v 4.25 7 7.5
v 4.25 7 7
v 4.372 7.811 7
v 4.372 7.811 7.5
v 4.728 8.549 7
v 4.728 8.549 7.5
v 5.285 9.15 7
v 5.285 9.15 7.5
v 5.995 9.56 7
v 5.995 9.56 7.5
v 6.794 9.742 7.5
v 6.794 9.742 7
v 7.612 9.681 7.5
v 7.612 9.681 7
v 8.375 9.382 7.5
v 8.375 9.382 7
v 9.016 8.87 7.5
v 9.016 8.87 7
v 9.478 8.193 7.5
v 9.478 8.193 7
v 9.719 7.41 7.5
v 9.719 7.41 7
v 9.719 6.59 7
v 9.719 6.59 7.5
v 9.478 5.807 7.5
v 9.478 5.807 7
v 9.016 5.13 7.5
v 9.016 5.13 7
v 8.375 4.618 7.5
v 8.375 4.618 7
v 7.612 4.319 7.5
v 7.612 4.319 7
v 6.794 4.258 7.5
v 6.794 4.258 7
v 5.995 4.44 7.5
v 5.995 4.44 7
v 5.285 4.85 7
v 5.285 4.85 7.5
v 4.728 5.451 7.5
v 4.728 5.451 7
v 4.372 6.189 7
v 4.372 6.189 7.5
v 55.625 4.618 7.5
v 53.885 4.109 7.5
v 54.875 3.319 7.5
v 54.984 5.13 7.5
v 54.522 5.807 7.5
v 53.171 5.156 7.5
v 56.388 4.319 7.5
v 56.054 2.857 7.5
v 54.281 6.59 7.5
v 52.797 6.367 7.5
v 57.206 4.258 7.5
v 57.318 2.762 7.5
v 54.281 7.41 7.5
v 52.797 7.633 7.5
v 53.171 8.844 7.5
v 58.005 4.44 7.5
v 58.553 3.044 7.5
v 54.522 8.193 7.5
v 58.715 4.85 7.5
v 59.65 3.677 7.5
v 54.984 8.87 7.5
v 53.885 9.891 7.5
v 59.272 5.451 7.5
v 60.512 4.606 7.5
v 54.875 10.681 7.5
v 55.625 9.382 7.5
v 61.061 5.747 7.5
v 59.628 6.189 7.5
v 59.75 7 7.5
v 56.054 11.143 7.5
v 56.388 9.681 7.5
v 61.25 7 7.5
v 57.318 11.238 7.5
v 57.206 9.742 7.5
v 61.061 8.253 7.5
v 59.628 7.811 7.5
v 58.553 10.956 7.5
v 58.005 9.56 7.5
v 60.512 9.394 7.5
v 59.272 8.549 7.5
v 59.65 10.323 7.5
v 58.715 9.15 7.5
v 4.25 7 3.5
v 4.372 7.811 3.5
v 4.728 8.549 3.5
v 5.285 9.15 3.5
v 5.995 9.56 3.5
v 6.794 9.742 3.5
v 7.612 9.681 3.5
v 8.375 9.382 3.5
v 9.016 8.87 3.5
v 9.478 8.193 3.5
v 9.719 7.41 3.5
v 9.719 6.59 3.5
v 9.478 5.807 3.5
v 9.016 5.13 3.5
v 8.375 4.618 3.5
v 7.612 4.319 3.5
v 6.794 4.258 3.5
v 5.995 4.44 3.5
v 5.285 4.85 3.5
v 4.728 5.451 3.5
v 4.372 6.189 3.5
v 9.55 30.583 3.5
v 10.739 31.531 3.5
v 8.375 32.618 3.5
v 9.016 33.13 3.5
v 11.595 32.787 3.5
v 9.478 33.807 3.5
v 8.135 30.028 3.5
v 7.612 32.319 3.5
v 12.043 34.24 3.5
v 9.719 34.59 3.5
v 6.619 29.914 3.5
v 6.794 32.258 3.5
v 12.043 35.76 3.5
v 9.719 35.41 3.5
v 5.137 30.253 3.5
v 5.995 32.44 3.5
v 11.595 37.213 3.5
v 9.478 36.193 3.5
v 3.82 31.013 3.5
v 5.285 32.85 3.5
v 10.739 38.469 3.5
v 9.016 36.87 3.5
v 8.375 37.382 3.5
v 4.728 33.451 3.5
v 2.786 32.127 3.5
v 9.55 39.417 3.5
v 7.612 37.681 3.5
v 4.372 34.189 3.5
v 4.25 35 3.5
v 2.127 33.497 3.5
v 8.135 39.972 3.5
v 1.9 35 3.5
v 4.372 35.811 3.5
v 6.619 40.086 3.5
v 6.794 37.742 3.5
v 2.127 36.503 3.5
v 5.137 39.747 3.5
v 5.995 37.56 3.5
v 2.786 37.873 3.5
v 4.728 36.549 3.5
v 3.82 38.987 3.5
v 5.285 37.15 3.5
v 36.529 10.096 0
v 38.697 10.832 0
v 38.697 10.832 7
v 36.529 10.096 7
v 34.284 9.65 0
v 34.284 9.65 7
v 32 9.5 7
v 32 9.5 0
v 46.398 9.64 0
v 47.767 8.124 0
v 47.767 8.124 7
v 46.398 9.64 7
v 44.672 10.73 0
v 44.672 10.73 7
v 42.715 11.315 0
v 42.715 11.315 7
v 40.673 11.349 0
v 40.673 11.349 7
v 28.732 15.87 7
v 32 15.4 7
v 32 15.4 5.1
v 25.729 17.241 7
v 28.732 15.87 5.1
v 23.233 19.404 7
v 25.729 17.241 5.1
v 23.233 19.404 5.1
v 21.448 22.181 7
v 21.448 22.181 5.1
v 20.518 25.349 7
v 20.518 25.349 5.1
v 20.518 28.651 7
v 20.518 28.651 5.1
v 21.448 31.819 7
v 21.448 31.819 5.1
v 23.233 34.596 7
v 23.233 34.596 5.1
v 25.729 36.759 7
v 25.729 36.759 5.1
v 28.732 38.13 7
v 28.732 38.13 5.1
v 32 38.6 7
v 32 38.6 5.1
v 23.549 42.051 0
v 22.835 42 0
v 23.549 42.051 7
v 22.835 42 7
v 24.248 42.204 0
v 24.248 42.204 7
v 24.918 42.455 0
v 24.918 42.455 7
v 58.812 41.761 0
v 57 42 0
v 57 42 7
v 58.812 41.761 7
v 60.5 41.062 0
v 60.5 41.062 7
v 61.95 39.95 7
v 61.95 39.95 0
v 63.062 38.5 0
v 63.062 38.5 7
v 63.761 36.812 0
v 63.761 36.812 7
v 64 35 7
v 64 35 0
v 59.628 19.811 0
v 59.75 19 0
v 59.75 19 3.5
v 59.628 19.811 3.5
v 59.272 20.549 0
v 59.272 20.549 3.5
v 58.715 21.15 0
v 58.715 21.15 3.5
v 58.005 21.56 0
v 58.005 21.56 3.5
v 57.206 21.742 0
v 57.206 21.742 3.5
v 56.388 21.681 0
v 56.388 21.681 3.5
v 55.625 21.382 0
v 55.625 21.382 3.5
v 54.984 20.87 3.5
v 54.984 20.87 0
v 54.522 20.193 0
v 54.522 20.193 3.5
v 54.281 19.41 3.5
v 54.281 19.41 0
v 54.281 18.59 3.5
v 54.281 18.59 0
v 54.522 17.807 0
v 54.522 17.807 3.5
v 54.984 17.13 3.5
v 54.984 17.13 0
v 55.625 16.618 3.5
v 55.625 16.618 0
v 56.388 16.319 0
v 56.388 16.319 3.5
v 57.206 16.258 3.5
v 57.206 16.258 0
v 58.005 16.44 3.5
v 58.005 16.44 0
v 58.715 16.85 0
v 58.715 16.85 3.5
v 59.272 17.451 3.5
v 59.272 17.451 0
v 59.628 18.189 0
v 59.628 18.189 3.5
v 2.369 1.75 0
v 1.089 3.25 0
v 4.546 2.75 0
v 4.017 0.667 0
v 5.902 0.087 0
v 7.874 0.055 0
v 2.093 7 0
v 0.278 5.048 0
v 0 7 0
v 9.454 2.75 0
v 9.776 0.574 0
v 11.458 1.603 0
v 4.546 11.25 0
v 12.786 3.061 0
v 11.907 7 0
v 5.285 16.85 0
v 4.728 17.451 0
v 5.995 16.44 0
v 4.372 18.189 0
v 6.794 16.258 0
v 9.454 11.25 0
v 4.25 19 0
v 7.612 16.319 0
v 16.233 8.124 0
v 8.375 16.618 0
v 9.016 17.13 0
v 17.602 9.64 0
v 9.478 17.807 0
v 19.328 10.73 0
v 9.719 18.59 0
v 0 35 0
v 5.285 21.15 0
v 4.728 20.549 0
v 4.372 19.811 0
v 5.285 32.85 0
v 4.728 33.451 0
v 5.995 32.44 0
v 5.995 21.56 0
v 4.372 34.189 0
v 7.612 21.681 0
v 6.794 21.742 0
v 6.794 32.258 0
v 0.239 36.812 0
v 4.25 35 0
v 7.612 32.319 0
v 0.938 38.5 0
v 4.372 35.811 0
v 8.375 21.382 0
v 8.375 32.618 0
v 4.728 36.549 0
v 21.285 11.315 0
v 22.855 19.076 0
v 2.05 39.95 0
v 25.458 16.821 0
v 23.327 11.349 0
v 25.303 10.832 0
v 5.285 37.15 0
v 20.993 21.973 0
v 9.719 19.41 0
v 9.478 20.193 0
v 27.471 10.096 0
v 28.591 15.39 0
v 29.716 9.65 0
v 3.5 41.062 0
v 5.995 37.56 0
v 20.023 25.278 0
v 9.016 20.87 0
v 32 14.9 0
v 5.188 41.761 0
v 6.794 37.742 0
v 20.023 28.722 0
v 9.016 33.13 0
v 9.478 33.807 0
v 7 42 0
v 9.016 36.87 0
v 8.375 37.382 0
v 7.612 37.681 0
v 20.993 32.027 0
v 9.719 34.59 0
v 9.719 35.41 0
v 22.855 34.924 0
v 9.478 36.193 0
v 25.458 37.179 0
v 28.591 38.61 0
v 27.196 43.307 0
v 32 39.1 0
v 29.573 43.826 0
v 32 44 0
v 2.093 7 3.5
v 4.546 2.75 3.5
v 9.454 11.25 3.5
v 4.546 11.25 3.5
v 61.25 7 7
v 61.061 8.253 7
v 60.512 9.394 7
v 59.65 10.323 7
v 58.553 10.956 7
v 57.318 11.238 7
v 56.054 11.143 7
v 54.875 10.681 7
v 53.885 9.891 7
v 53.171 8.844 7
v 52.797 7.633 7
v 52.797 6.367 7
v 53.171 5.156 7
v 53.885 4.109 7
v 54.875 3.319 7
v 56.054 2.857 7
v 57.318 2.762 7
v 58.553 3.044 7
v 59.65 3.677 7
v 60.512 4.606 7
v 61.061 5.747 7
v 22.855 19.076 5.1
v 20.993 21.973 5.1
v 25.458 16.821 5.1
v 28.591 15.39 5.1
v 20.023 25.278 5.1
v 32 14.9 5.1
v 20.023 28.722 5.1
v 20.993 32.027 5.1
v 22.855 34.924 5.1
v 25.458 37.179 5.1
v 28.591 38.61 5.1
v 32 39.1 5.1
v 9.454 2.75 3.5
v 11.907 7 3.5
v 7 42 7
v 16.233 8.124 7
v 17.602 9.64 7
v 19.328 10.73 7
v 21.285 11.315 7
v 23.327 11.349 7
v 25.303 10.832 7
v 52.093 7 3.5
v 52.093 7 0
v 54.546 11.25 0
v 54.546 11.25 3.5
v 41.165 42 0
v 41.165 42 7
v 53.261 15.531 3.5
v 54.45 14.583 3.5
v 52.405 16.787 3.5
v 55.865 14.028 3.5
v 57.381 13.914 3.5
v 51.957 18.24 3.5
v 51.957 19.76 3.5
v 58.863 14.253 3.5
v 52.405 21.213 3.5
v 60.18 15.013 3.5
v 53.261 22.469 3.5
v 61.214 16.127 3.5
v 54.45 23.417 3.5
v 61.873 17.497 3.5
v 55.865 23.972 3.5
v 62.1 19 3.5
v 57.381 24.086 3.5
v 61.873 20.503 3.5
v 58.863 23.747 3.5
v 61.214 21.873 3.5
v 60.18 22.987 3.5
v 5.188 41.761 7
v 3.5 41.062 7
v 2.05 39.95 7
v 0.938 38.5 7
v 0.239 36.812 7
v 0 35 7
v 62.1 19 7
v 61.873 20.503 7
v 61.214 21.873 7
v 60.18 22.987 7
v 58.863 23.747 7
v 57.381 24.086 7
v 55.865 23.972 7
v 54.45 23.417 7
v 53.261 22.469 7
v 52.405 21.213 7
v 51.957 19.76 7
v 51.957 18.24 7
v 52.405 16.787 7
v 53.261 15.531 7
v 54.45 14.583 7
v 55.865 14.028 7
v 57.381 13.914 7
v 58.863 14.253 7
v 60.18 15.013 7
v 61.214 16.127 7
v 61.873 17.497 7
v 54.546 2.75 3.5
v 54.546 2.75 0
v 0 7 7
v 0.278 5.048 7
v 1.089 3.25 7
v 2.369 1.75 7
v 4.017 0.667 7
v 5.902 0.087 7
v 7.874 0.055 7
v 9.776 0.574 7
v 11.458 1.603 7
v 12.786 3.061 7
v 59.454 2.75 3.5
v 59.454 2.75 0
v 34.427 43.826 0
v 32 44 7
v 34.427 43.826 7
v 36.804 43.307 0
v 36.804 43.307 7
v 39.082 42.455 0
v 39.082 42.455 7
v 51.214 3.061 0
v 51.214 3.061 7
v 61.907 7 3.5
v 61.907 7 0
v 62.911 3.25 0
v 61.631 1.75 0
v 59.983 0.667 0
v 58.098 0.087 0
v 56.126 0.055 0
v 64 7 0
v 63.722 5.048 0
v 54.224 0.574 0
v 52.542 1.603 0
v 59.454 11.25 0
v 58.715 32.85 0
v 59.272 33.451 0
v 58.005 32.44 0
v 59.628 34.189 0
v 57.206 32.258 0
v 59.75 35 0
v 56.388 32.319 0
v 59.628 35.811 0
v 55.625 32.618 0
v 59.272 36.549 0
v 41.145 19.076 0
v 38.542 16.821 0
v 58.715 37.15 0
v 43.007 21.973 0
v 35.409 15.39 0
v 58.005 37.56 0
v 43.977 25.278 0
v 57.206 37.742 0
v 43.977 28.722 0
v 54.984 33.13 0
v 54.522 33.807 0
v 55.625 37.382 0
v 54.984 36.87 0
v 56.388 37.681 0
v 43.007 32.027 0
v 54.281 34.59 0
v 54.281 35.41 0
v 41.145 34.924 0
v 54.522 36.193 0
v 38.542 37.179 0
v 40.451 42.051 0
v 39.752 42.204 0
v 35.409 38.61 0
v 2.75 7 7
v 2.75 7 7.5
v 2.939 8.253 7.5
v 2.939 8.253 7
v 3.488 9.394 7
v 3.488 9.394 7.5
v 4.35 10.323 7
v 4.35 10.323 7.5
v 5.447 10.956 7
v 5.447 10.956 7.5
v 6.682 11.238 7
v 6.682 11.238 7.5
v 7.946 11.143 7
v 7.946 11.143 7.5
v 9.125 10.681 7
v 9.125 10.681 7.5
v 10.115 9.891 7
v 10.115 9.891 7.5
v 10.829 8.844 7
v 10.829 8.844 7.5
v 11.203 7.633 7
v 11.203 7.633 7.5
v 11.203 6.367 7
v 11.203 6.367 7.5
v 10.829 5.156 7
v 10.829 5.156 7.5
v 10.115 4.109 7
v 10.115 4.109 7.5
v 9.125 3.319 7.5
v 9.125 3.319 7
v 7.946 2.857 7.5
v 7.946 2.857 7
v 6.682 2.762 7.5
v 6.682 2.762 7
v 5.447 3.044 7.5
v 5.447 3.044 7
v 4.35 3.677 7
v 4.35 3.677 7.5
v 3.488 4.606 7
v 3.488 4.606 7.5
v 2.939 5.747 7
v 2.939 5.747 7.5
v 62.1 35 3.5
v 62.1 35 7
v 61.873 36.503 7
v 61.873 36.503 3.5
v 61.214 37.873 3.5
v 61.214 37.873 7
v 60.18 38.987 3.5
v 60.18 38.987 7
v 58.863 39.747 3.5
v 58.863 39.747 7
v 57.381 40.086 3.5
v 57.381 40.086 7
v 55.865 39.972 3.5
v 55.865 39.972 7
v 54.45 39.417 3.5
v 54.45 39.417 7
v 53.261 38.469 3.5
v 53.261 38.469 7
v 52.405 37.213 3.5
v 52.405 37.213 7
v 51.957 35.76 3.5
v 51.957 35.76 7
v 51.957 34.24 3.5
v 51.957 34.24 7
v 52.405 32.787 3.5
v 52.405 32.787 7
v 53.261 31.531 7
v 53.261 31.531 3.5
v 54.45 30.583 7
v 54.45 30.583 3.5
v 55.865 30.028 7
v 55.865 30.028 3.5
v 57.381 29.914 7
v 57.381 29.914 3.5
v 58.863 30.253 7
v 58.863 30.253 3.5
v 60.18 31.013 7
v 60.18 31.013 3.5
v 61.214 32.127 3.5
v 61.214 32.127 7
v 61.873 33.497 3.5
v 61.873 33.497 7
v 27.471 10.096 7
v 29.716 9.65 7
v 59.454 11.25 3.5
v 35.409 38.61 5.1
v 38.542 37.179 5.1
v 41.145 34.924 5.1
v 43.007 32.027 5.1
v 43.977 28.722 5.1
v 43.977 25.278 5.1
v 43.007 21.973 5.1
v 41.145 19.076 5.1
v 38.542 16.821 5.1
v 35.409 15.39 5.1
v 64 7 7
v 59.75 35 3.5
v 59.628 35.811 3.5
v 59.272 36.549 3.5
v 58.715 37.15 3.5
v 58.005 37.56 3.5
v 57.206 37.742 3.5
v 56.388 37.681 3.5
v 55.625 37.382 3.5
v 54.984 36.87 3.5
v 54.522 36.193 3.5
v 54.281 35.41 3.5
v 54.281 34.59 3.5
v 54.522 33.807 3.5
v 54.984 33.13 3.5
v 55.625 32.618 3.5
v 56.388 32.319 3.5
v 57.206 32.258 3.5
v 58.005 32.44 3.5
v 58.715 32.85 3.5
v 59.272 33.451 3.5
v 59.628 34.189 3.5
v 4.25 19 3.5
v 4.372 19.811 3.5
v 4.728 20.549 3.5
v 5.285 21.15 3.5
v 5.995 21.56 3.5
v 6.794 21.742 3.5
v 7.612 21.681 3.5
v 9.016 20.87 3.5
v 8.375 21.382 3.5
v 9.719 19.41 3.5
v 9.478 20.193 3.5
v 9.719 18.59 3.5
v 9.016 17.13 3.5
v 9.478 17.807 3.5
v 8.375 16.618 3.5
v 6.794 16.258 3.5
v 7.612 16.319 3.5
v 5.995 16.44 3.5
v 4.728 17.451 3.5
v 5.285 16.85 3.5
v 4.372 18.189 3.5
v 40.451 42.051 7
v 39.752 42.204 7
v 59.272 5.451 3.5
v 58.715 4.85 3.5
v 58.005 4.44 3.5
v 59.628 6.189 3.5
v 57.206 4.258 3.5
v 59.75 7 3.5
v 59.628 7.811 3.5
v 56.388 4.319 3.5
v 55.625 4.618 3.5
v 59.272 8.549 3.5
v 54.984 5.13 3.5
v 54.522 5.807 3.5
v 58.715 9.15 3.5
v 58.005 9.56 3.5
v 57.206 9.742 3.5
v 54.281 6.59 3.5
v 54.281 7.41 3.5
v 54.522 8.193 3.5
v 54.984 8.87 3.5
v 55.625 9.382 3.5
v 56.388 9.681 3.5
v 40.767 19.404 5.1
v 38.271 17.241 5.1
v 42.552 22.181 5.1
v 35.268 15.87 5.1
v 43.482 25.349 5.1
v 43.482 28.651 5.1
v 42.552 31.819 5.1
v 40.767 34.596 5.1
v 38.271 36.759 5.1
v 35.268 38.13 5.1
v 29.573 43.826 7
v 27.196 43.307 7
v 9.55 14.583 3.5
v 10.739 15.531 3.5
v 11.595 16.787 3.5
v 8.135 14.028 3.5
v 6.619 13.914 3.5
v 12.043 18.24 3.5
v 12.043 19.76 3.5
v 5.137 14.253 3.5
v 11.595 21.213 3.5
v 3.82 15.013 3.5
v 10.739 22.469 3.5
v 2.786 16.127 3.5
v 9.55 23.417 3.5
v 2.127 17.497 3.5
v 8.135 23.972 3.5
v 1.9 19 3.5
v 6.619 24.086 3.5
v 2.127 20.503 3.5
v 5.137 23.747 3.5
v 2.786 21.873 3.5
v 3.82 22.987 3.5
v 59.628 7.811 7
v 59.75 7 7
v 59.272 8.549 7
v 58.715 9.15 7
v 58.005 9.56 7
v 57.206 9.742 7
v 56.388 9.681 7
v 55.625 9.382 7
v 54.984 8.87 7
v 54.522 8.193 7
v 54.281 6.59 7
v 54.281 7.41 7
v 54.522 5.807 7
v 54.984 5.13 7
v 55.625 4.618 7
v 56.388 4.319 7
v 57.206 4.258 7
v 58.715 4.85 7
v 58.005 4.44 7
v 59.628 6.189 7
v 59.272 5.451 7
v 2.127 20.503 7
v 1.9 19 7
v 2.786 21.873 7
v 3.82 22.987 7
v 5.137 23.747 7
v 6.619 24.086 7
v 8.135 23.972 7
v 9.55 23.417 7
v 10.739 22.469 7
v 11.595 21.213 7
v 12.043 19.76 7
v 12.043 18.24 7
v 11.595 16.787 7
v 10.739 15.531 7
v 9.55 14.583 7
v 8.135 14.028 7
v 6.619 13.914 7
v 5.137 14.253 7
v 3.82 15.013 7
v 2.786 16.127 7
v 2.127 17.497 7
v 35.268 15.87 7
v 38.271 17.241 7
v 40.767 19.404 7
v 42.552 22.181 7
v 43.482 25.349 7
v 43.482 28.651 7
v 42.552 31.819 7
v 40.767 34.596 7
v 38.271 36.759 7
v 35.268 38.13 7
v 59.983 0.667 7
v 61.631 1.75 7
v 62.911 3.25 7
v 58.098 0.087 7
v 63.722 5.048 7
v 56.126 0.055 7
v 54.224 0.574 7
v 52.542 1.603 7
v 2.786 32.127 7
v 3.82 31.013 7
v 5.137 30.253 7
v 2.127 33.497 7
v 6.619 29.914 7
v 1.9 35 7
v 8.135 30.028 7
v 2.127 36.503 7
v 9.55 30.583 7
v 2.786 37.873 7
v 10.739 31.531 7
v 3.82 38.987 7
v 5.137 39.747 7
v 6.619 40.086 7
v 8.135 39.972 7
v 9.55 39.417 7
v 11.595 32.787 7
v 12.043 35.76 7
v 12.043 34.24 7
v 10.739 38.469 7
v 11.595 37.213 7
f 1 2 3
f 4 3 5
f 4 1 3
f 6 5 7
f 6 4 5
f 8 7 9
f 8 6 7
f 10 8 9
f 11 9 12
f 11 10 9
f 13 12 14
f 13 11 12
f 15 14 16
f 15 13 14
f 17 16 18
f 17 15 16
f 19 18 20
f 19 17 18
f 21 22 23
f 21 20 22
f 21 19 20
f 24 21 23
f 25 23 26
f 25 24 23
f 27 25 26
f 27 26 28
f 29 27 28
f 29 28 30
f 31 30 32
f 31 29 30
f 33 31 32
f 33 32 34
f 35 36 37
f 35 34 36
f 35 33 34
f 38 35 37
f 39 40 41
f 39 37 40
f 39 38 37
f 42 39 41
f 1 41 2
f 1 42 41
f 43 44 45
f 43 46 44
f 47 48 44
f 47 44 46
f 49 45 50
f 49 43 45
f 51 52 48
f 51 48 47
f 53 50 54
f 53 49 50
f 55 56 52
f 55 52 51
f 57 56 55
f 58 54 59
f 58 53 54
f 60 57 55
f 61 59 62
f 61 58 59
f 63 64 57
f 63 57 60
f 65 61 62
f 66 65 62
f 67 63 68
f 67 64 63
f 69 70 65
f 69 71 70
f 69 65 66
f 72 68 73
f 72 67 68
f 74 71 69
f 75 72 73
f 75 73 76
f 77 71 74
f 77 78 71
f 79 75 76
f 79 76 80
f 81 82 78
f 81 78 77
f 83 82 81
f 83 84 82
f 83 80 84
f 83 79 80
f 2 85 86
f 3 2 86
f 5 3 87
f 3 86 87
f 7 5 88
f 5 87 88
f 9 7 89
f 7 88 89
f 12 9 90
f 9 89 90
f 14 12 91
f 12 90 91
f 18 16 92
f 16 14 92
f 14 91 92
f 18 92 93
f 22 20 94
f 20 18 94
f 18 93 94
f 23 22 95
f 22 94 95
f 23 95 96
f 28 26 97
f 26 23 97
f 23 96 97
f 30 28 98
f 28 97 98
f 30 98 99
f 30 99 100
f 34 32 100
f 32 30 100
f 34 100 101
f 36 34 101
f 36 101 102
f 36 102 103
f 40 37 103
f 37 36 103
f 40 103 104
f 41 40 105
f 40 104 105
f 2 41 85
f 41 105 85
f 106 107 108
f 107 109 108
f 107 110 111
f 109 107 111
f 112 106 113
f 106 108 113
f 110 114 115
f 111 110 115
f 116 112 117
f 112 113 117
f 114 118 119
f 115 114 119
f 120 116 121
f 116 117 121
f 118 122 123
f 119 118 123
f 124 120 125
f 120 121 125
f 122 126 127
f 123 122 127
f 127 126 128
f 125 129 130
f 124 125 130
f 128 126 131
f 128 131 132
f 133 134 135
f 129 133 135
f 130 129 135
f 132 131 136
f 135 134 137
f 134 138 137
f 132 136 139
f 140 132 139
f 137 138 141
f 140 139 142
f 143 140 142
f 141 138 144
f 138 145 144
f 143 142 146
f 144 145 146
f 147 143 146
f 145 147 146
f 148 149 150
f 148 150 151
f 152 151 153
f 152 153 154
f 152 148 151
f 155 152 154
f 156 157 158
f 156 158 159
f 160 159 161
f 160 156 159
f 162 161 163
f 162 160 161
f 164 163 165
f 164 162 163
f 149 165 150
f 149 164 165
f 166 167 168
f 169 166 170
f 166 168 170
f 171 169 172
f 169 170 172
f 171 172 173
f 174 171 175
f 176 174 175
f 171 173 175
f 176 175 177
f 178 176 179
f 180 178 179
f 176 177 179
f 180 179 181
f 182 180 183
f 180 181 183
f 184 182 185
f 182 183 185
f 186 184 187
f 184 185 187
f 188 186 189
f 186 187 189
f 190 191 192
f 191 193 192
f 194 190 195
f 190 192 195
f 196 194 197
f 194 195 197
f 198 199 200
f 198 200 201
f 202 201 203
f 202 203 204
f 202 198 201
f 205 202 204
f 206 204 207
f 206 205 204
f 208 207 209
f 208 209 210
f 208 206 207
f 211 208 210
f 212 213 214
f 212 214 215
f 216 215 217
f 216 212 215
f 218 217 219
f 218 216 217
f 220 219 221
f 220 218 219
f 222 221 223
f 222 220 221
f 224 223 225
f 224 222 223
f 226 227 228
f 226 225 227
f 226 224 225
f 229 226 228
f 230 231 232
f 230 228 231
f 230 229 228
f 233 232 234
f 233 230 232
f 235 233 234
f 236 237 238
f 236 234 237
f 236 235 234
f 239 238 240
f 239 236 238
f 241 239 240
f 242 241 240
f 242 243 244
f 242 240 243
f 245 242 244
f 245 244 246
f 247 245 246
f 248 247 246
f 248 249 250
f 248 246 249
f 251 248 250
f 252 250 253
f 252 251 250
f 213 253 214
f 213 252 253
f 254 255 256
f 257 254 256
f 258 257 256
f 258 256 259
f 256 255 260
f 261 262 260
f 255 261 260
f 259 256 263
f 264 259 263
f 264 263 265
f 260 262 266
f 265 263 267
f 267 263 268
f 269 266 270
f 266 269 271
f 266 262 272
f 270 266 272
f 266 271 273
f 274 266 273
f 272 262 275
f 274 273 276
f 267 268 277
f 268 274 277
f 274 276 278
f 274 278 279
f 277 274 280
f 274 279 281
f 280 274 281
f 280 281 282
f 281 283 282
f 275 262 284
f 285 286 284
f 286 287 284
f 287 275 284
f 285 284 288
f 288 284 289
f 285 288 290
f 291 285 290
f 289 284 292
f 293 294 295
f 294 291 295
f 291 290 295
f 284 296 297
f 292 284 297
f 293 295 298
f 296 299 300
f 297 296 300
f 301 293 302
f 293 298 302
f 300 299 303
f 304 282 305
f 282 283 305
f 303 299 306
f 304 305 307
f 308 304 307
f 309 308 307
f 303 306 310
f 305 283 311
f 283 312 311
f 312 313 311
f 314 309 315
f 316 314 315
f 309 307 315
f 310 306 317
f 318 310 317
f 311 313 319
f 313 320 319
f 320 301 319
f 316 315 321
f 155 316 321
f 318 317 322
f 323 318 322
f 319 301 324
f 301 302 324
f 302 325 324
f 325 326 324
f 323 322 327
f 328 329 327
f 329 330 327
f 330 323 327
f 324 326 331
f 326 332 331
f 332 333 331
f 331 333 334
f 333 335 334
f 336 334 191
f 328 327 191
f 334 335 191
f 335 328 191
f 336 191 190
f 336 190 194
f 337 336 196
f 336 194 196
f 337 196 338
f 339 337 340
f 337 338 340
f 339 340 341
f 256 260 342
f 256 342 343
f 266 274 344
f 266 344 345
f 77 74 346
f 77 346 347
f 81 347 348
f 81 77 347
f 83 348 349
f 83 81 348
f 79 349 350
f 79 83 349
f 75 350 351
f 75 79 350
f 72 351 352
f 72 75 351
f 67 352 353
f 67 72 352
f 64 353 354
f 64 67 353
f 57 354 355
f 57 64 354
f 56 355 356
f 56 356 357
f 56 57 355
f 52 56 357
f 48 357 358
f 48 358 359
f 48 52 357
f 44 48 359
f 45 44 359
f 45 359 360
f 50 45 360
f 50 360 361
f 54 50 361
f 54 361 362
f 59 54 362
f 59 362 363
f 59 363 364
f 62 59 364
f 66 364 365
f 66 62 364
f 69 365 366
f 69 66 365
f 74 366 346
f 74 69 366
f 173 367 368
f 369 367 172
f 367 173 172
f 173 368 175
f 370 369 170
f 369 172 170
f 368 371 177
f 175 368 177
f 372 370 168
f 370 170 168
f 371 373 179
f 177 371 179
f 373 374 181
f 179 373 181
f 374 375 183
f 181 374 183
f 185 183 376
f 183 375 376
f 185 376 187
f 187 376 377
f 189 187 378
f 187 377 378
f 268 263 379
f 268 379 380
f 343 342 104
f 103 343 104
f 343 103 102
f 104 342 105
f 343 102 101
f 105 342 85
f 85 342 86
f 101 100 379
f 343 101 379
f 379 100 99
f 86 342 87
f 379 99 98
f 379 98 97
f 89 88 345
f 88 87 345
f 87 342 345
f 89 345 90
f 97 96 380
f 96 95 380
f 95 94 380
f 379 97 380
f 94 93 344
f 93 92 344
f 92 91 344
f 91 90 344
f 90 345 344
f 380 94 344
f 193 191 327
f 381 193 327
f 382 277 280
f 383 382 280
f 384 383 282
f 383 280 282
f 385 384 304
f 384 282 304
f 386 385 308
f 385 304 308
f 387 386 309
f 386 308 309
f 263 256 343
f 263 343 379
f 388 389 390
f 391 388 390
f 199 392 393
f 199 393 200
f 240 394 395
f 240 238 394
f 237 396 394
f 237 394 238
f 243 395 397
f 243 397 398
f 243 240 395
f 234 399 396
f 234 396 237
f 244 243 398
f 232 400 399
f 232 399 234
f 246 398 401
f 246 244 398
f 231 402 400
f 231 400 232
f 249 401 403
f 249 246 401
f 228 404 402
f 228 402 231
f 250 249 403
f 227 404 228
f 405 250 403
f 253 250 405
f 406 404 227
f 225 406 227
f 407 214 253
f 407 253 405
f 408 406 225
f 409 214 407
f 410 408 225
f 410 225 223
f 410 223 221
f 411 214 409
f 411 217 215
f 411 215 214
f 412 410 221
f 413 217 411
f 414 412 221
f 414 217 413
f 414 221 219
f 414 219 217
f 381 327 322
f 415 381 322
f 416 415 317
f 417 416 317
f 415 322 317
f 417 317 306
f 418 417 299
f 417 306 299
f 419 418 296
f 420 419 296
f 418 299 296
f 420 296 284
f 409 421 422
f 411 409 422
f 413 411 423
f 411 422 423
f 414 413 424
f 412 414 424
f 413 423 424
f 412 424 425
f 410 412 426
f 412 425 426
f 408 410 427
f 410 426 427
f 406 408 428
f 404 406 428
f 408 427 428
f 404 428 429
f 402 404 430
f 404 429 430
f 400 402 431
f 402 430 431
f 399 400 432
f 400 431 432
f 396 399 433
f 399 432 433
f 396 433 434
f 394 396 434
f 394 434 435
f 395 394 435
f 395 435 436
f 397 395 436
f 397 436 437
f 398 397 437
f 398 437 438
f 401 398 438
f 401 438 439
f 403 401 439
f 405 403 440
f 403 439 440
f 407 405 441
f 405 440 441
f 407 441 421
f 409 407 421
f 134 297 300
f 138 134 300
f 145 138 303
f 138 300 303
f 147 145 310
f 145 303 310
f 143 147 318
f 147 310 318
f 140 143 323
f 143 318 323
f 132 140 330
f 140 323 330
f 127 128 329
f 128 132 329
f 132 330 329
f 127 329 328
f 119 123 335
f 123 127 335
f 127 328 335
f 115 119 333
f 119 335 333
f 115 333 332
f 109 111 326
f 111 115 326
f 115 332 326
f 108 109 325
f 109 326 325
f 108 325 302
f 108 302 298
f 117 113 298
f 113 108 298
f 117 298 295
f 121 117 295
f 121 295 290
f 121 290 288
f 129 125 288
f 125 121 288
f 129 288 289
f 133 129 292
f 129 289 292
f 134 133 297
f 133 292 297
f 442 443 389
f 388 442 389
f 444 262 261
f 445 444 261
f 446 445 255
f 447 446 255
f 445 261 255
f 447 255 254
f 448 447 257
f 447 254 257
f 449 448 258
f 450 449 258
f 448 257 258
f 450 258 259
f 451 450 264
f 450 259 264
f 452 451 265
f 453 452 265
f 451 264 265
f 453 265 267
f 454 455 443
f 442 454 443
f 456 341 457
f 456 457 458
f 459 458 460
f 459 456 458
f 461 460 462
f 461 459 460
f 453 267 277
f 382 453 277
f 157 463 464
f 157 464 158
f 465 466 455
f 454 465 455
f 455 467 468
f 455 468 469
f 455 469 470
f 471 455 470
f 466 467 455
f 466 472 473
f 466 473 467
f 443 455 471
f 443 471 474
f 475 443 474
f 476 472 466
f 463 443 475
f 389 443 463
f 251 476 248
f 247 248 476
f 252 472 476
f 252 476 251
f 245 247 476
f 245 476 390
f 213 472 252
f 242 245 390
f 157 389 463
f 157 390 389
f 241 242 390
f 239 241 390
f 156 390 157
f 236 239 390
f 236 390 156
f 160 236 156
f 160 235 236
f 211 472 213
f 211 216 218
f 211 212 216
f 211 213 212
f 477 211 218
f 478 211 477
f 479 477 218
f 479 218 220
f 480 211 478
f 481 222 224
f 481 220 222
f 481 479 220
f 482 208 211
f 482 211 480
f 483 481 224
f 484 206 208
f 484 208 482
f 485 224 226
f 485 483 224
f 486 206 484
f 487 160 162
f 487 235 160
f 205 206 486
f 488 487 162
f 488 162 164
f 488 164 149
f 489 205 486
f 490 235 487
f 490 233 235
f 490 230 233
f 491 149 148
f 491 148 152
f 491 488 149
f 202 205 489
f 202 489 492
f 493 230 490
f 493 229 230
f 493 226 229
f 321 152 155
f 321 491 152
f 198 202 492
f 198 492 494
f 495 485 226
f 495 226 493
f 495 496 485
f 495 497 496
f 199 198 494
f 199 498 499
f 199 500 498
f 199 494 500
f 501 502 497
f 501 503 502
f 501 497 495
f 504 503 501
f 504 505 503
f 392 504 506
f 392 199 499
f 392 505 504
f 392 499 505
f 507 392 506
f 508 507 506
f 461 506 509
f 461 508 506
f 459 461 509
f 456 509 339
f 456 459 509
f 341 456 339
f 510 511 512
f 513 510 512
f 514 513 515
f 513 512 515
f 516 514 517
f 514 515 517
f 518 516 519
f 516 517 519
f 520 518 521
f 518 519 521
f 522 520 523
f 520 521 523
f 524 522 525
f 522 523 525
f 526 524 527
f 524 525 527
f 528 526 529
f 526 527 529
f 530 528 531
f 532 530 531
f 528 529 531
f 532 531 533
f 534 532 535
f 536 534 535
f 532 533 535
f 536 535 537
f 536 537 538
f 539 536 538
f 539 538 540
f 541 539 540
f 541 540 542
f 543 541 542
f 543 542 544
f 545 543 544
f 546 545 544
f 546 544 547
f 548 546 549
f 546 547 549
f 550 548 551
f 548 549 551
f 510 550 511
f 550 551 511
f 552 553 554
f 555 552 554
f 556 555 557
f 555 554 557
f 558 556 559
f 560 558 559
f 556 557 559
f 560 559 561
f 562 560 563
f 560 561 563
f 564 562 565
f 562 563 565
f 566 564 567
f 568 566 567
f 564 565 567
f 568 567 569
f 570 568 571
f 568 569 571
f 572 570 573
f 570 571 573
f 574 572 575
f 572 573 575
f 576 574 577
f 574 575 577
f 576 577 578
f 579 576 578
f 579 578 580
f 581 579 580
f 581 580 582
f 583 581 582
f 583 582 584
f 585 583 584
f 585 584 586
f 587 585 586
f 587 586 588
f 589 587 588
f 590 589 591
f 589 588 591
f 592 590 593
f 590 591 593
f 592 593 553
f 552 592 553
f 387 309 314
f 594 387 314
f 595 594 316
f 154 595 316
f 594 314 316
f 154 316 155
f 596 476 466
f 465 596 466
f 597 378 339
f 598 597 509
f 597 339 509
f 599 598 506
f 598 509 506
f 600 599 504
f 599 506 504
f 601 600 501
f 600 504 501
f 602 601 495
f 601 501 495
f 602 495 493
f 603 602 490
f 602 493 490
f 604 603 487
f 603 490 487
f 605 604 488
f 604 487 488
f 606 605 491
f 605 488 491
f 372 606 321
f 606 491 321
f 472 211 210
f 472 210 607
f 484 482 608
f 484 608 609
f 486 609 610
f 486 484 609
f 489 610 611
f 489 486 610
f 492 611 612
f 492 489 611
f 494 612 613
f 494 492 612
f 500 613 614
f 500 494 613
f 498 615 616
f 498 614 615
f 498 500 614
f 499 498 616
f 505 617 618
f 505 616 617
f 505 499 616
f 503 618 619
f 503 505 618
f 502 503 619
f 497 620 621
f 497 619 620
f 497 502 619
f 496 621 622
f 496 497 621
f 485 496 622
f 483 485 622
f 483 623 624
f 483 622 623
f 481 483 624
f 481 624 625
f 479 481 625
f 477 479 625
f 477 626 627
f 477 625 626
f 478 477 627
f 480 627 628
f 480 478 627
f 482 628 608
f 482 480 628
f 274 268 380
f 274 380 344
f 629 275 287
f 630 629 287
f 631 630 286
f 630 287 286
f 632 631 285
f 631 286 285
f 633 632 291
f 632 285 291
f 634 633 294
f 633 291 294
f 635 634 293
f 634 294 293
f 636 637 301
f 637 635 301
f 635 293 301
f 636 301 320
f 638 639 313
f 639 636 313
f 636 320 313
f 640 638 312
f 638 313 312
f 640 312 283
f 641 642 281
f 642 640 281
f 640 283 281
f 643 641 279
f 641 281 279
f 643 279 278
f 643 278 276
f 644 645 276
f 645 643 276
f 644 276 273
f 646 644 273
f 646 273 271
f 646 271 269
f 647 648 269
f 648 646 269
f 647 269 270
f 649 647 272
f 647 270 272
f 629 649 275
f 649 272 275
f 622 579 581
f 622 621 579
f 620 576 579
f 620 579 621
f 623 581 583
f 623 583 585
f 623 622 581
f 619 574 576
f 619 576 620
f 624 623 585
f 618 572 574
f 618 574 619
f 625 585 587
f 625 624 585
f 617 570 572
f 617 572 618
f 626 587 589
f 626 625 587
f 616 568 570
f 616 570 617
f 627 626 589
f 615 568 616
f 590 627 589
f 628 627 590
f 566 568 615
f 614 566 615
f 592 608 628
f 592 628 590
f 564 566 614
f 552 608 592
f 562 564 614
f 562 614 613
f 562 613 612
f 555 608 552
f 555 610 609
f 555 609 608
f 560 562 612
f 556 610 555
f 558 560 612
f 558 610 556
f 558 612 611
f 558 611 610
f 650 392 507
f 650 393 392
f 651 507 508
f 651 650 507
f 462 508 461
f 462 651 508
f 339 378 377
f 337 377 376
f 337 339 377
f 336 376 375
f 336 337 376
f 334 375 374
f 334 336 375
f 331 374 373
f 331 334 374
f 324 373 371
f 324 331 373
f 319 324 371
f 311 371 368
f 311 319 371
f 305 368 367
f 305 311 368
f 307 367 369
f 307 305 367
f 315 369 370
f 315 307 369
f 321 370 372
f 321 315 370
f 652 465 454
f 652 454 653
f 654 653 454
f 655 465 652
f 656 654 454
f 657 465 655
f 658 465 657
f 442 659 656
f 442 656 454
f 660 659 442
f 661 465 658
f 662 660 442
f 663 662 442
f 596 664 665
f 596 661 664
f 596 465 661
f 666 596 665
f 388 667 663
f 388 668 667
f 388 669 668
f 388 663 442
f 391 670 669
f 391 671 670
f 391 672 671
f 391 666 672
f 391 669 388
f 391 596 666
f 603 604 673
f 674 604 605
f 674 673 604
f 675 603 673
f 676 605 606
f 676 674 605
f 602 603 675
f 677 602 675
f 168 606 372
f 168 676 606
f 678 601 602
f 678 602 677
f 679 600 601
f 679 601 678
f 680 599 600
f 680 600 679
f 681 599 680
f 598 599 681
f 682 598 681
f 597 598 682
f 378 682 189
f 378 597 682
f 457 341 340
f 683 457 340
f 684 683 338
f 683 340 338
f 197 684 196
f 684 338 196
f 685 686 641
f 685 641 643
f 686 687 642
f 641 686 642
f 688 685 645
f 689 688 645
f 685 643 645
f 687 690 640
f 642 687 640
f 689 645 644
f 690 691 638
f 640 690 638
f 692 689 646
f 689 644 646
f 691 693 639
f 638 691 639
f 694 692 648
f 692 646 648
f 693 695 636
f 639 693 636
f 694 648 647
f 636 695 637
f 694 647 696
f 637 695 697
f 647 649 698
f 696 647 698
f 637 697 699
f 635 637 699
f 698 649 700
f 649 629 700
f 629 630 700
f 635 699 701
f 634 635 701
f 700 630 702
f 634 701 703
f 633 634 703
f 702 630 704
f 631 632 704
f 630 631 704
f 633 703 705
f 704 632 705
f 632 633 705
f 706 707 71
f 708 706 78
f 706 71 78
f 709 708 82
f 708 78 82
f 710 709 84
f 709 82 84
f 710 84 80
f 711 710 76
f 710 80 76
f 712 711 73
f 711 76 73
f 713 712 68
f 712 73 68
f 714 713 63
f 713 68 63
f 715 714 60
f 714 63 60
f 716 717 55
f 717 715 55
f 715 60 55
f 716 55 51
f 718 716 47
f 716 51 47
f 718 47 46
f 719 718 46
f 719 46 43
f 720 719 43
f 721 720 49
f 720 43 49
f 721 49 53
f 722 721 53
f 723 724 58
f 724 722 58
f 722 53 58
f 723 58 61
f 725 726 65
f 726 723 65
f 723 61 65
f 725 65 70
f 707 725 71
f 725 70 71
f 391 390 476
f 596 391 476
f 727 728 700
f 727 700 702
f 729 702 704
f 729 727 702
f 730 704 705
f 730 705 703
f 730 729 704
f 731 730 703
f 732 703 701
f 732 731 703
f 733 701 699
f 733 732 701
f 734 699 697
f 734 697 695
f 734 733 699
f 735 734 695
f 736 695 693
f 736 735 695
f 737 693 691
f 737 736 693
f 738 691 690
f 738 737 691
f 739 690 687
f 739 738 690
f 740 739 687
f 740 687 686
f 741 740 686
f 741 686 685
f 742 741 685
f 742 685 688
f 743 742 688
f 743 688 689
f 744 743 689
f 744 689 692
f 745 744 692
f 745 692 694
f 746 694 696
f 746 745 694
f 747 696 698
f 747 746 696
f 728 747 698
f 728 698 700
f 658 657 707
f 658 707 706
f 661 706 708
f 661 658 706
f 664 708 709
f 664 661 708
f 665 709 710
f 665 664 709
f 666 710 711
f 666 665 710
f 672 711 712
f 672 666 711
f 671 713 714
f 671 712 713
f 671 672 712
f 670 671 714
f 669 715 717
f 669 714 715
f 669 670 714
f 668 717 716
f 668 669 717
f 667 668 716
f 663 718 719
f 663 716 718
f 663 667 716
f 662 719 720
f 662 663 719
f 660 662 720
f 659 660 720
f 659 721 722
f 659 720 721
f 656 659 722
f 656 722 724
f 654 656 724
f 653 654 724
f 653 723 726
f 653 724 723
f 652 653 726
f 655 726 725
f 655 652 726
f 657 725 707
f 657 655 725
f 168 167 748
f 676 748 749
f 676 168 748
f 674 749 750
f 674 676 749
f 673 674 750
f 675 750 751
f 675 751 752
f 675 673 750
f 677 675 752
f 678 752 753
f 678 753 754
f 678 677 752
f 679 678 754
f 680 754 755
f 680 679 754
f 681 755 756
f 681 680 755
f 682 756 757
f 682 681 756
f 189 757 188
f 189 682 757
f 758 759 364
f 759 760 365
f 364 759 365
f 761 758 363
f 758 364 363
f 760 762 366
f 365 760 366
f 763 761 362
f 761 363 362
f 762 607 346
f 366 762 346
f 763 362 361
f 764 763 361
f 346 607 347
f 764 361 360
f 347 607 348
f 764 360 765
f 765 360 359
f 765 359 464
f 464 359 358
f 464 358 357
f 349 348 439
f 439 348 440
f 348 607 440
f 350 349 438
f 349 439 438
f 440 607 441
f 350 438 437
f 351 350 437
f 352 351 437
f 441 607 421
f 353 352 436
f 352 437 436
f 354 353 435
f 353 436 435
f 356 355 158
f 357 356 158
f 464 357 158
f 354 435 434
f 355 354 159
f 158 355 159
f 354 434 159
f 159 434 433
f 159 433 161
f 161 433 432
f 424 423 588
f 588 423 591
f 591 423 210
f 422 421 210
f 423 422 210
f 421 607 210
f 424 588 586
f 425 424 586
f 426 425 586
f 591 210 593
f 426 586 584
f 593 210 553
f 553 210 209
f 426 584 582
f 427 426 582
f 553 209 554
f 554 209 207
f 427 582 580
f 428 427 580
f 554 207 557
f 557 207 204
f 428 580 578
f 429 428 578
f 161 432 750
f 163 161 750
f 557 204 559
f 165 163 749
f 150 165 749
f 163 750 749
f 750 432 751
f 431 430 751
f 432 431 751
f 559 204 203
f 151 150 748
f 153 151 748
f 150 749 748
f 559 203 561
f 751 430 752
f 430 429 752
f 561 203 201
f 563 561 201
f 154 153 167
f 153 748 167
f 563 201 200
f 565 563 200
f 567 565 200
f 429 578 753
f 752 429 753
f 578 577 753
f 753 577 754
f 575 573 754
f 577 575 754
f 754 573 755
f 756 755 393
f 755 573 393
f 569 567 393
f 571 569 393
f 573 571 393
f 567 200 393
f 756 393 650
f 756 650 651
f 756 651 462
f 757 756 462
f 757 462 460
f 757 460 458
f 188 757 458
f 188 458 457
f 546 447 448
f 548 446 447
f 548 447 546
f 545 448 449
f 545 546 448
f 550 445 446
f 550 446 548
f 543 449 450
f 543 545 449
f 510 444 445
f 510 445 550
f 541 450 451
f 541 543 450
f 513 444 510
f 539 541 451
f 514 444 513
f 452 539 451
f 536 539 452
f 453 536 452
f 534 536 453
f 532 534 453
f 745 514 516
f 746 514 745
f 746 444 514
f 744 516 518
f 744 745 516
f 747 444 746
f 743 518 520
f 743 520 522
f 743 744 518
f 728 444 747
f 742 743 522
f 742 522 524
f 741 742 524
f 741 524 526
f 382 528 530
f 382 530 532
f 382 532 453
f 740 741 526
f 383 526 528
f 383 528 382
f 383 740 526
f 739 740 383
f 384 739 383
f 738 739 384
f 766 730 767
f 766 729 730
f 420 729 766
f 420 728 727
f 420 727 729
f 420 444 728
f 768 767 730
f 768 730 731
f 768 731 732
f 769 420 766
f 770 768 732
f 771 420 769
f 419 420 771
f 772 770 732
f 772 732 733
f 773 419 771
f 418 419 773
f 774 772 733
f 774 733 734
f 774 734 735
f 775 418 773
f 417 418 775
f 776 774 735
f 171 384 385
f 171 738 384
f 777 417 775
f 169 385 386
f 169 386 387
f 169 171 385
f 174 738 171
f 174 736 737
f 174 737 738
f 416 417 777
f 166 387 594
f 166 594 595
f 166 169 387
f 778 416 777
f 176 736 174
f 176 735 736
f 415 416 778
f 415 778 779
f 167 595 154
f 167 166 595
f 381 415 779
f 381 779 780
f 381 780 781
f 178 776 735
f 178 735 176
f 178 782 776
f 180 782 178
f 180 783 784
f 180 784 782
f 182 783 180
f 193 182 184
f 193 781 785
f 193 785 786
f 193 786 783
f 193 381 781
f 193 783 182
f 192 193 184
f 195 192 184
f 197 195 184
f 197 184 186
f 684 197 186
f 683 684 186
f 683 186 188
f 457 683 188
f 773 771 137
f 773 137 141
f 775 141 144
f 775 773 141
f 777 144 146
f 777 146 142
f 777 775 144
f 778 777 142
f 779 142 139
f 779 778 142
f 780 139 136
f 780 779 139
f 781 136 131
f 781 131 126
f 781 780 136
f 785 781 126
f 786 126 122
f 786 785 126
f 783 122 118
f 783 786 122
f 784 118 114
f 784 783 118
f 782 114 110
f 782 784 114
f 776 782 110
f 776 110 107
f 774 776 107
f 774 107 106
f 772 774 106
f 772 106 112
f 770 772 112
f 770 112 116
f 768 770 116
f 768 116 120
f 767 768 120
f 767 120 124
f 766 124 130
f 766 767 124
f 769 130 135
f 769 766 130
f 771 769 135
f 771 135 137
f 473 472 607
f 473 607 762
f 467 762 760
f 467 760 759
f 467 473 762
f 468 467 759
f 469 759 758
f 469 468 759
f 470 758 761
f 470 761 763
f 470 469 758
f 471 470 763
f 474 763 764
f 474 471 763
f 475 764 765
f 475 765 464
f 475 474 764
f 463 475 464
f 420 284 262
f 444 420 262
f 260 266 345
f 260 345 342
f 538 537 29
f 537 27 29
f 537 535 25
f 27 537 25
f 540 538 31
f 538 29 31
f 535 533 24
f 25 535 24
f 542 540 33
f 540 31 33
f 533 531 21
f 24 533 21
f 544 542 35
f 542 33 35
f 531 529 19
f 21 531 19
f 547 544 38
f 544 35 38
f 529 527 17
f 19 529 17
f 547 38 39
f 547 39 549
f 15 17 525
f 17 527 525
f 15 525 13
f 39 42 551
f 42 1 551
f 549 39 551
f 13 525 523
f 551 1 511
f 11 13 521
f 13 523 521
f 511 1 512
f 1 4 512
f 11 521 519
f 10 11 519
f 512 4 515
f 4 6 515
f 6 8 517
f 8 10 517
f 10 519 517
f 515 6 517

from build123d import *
from build123d.topology import SkipClean

# Parameters (mm, degrees)
BOSS_EXTRUDE1_DEPTH     = 7
CUT_EXTRUDE1_DEPTH      = 78.980769199
CUT_EXTRUDE1_DEPTH_BACK = 78.980769199
SKETCH3_R               = 2.75
SKETCH4_R               = 12.1
CUT_EXTRUDE2_DEPTH      = 5.1
BOSS_EXTRUDE2_START     = 0.5
SKETCH5_R               = 4.25
SKETCH5_R_2             = 2.75
BOSS_EXTRUDE2_DEPTH     = 0.5
SKETCH6_R               = 5.1
CUT_EXTRUDE3_DEPTH      = 3.5
FILLET1_R               = 5
CUT_EXTRUDE4_DEPTH      = 3.5


with BuildPart() as part:
    # Sketch1 → Boss-Extrude1 (new body)
    with BuildSketch(Plane.XY):
        with BuildLine():
            Line((64.000002369, 34.999998632), (64.000002369, 7.0000007))
            ThreePointArc((64.000002369, 7.0000007), (59.061035156, 0.310296383), (51.213675554, 3.060657863))
            Line((51.213675554, 3.060657863), (47.766721553, 8.123736451))
            ThreePointArc((47.766721553, 8.123736451), (43.713065604, 11.089441566), (38.696960231, 10.832108598))
            ThreePointArc((38.696960231, 10.832108598), (35.414081121, 9.836258221), (32.00000085, 9.5000007))
            Line((32.00000085, 9.5000007), (32.00000085, 15.4000007))
            ThreePointArc((32.00000085, 15.4000007), (43.60000085, 27.0000007), (32.00000085, 38.6000007))
            Line((32.00000085, 38.6000007), (32.00000085, 44.0000007))
            ThreePointArc((32.00000085, 44.0000007), (36.123106475, 43.492423203), (40.00000085, 42.0000007))
            Line((40.00000085, 42.0000007), (57.000002369, 42.0000007))
            ThreePointArc((57.000002369, 42.0000007), (61.9497513, 39.949747563), (64.000002369, 34.999998632))
        make_face()
    extrude(amount=BOSS_EXTRUDE1_DEPTH)

    # Sketch3 → Cut-Extrude1 (cut, two sides: drawn at the far end of the back side and taken through both)
    with BuildSketch(Plane.XY.offset(7).offset(-CUT_EXTRUDE1_DEPTH_BACK)):
        with Locations((56.999999697, 35.000001537)):
            Circle(SKETCH3_R)
        with Locations((56.999999697, 19.000001537)):
            Circle(SKETCH3_R)
        with Locations((56.999999697, 7.000001537)):
            Circle(SKETCH3_R)
    extrude(amount=CUT_EXTRUDE1_DEPTH + CUT_EXTRUDE1_DEPTH_BACK, mode=Mode.SUBTRACT)

    # Sketch4 → Cut-Extrude2 (cut)
    with BuildSketch(Plane(origin=(0, 0, 0), x_dir=(-1, 0, 0), z_dir=(0, 0, -1))):
        with Locations((-32.00000085, 27.0000007)):
            Circle(SKETCH4_R)
    extrude(amount=-CUT_EXTRUDE2_DEPTH, mode=Mode.SUBTRACT)

    # Sketch5 → Boss-Extrude2 (add)
    with BuildSketch(Plane.XY.offset(7).offset(BOSS_EXTRUDE2_START)):
        with Locations((56.999999697, 7.000001537)):
            Circle(SKETCH5_R)
        with Locations((56.999999697, 7.000001537)):
            Circle(SKETCH5_R_2, mode=Mode.SUBTRACT)
    extrude(amount=-BOSS_EXTRUDE2_DEPTH)

    # Sketch6 → Cut-Extrude3 (cut)
    with BuildSketch(Plane.XY.offset(7)):
        with Locations((56.999999697, 19.000001537)):
            Circle(SKETCH6_R)
        with Locations((56.999999697, 35.000001537)):
            Circle(SKETCH6_R)
    extrude(amount=-CUT_EXTRUDE3_DEPTH, mode=Mode.SUBTRACT)

    # Fillet1
    fillet1_edges = [part.edges().sort_by_distance(p)[0] for p in [
        (40.00000085, 42.0000007, 3.5),
    ]]
    fillet(fillet1_edges, radius=FILLET1_R)

    # Sketch8 → Cut-Extrude4 (cut)
    with BuildSketch(Plane(origin=(0, 0, 0), x_dir=(-1, 0, 0), z_dir=(0, 0, -1))):
        Polygon((-54.546261053, 11.250001537), (-59.453738341, 11.250001537), (-61.907476985, 7.000001537), (-59.453738341, 2.750001537), (-54.546261053, 2.750001537), (-52.092522409, 7.000001537), align=None)
    extrude(amount=-CUT_EXTRUDE4_DEPTH, mode=Mode.SUBTRACT)

    # Mirror2: part across plane


with BuildPart() as part_1:
    with SkipClean():  # the faces are left unmerged after this step: merging them gives an invalid solid
        add(part.part)
        add(part.part.mirror(Plane(origin=(32.00000085, 44.0000007, 7), x_dir=(0, 0, 1), z_dir=(1, 0, 0))))


solid = part_1.part
